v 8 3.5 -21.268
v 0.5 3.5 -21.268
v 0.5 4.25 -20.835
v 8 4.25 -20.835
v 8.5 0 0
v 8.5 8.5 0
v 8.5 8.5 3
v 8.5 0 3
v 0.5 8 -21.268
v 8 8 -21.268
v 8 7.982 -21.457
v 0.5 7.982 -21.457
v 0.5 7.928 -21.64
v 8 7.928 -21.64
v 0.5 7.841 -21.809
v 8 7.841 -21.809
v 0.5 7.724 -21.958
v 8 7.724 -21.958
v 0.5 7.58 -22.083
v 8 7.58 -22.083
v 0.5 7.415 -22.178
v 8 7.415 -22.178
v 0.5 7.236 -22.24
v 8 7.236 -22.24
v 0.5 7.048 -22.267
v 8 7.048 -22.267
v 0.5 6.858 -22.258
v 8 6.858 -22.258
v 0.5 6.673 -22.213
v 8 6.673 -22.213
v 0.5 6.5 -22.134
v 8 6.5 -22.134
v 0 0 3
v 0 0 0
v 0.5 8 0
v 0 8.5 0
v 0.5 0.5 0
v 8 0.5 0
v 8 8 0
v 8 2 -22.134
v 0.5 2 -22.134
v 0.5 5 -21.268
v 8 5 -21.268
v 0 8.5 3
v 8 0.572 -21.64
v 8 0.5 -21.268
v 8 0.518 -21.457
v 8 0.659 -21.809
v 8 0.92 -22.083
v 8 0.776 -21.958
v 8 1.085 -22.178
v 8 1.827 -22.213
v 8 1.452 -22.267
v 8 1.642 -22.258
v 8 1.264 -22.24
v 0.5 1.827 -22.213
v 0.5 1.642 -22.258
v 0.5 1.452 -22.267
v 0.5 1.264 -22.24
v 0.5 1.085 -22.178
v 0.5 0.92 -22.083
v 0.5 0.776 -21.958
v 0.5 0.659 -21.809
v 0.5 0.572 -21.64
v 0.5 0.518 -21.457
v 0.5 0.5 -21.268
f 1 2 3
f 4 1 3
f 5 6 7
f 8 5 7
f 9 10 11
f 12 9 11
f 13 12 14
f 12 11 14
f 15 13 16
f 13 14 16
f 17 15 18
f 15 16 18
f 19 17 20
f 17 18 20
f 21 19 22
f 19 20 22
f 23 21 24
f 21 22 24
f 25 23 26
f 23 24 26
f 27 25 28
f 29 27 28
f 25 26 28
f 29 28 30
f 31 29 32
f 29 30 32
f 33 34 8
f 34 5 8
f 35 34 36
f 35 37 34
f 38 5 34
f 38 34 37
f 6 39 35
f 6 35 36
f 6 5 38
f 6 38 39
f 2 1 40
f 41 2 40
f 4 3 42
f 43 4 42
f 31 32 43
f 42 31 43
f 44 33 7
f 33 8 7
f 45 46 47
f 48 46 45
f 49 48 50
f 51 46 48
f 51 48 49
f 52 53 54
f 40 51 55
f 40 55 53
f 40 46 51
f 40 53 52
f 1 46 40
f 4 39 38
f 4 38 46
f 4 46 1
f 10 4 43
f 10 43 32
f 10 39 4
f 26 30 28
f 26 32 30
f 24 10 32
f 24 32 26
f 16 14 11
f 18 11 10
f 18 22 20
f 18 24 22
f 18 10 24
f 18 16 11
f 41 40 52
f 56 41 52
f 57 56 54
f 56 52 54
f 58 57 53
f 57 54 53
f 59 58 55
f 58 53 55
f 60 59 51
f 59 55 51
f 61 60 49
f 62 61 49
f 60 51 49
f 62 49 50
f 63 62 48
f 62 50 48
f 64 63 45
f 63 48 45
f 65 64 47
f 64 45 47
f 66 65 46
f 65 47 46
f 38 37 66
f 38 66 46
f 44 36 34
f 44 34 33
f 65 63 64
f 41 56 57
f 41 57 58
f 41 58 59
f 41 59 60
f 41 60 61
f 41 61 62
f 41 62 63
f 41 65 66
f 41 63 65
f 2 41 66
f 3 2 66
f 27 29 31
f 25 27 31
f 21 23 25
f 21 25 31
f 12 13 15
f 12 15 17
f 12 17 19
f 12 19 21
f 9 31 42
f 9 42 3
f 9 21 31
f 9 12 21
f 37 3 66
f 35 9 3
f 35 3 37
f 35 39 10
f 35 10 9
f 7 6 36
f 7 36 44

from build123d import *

# Parameters (mm, degrees)
BOSS_EXTRUDE1_START   = -0.5
BOSS_EXTRUDE1_DEPTH   = 8
BOSS_EXTRUDE1_2_DEPTH = 7.5
CUT_EXTRUDE1_DEPTH    = 0.5
SKETCH3_W             = 8
SKETCH3_H             = 24.267949192
BOSS_EXTRUDE2_DEPTH   = 0.5
CUT_EXTRUDE2_DEPTH    = 7.5
CUT_EXTRUDE3_DEPTH    = 0.433012702
CUT_EXTRUDE4_DEPTH    = 20.834936491
SKETCH7_W             = 3
SKETCH7_H             = 8.5
BOSS_EXTRUDE3_DEPTH   = 0.5


with BuildPart() as part:
    # Boss-Extrude1: read off the stored shape, not the designer's step
    # Boss-Extrude1 outline → Boss-Extrude1 (new body)
    with BuildSketch(Plane.ZY.offset(-8).offset(BOSS_EXTRUDE1_START)):
        with BuildLine():
            Line((-21.267949192, 8.5), (-21.267949192, 3.5))
            Line((-21.267949192, 3.5), (-22.133974596, 2))
            ThreePointArc((-22.133974596, 2), (-22.133974596, 1), (-21.267949192, 0.5))
            Line((-21.267949192, 0.5), (3, 0.5))
            Line((3, 0.5), (3, 8.5))
            Line((3, 8.5), (-21.267949192, 8.5))
        make_face()
    extrude(amount=BOSS_EXTRUDE1_DEPTH)

    # Boss-Extrude1 2 outline → Boss-Extrude1 2 (add)
    with BuildSketch(Plane.ZY.offset(-8)):
        with BuildLine():
            Line((-22.133974596, 6.5), (-21.267949192, 5))
            Line((-21.267949192, 5), (-21.267949192, 8))
            ThreePointArc((-21.267949192, 8), (-22.133974596, 7.5), (-22.133974596, 6.5))
        make_face()
    extrude(amount=BOSS_EXTRUDE1_2_DEPTH)

    # Sketch2 → Cut-Extrude1 (cut)
    with BuildSketch(Plane(origin=(8.5, 0, 0), x_dir=(0, 0, -1), z_dir=(1, 0, 0))):
        with BuildLine():
            Line((22.133974596, 2), (21.267949192, 3.5))
            Line((21.267949192, 3.5), (21.267949192, 0.5))
            ThreePointArc((21.267949192, 0.5), (22.133974596, 1), (22.133974596, 2))
        make_face()
    extrude(amount=-CUT_EXTRUDE1_DEPTH, mode=Mode.SUBTRACT)

    # Sketch3 → Boss-Extrude2 (add)
    with BuildSketch(Plane.XZ.offset(-0.5)):
        with Locations((4.5, -9.133974596)):
            Rectangle(SKETCH3_W, SKETCH3_H)
    extrude(amount=BOSS_EXTRUDE2_DEPTH)

    # Sketch4 → Cut-Extrude2 (cut)
    with BuildSketch(Plane.ZY.offset(-0.5)):
        Polygon((-21.267949192, 3.5), (-20.834936491, 4.25), (-21.267949192, 5), align=None)
    extrude(amount=-CUT_EXTRUDE2_DEPTH, mode=Mode.SUBTRACT)

    # Sketch5 → Cut-Extrude3 (cut)
    with BuildSketch(Plane(origin=(0, 0, -21.267949192), x_dir=(-1, 0, 0), z_dir=(0, 0, -1))):
        Polygon((-0.5, 8), (-0.5, 8.5), (-8.5, 8.5), (-8.5, 0), (-0.5, 0), (-0.5, 0.5), (-8, 0.5), (-8, 4.25), (-8, 8), align=None)
    extrude(amount=-CUT_EXTRUDE3_DEPTH, mode=Mode.SUBTRACT)

    # Sketch6 → Cut-Extrude4 (cut)
    with BuildSketch(Plane(origin=(0, 0, -20.834936491), x_dir=(-1, 0, 0), z_dir=(0, 0, -1))):
        Polygon((-0.5, 8), (-0.5, 8.5), (-8.5, 8.5), (-8.5, 0), (-0.5, 0), (-0.5, 0.5), (-8, 0.5), (-8, 8), align=None)
    extrude(amount=-CUT_EXTRUDE4_DEPTH, mode=Mode.SUBTRACT)

    # Sketch7 → Boss-Extrude3 (add)
    with BuildSketch(Plane.ZY.offset(-0.5)):
        with Locations((1.5, 4.25)):
            Rectangle(SKETCH7_W, SKETCH7_H)
    extrude(amount=BOSS_EXTRUDE3_DEPTH)


solid = part.part
